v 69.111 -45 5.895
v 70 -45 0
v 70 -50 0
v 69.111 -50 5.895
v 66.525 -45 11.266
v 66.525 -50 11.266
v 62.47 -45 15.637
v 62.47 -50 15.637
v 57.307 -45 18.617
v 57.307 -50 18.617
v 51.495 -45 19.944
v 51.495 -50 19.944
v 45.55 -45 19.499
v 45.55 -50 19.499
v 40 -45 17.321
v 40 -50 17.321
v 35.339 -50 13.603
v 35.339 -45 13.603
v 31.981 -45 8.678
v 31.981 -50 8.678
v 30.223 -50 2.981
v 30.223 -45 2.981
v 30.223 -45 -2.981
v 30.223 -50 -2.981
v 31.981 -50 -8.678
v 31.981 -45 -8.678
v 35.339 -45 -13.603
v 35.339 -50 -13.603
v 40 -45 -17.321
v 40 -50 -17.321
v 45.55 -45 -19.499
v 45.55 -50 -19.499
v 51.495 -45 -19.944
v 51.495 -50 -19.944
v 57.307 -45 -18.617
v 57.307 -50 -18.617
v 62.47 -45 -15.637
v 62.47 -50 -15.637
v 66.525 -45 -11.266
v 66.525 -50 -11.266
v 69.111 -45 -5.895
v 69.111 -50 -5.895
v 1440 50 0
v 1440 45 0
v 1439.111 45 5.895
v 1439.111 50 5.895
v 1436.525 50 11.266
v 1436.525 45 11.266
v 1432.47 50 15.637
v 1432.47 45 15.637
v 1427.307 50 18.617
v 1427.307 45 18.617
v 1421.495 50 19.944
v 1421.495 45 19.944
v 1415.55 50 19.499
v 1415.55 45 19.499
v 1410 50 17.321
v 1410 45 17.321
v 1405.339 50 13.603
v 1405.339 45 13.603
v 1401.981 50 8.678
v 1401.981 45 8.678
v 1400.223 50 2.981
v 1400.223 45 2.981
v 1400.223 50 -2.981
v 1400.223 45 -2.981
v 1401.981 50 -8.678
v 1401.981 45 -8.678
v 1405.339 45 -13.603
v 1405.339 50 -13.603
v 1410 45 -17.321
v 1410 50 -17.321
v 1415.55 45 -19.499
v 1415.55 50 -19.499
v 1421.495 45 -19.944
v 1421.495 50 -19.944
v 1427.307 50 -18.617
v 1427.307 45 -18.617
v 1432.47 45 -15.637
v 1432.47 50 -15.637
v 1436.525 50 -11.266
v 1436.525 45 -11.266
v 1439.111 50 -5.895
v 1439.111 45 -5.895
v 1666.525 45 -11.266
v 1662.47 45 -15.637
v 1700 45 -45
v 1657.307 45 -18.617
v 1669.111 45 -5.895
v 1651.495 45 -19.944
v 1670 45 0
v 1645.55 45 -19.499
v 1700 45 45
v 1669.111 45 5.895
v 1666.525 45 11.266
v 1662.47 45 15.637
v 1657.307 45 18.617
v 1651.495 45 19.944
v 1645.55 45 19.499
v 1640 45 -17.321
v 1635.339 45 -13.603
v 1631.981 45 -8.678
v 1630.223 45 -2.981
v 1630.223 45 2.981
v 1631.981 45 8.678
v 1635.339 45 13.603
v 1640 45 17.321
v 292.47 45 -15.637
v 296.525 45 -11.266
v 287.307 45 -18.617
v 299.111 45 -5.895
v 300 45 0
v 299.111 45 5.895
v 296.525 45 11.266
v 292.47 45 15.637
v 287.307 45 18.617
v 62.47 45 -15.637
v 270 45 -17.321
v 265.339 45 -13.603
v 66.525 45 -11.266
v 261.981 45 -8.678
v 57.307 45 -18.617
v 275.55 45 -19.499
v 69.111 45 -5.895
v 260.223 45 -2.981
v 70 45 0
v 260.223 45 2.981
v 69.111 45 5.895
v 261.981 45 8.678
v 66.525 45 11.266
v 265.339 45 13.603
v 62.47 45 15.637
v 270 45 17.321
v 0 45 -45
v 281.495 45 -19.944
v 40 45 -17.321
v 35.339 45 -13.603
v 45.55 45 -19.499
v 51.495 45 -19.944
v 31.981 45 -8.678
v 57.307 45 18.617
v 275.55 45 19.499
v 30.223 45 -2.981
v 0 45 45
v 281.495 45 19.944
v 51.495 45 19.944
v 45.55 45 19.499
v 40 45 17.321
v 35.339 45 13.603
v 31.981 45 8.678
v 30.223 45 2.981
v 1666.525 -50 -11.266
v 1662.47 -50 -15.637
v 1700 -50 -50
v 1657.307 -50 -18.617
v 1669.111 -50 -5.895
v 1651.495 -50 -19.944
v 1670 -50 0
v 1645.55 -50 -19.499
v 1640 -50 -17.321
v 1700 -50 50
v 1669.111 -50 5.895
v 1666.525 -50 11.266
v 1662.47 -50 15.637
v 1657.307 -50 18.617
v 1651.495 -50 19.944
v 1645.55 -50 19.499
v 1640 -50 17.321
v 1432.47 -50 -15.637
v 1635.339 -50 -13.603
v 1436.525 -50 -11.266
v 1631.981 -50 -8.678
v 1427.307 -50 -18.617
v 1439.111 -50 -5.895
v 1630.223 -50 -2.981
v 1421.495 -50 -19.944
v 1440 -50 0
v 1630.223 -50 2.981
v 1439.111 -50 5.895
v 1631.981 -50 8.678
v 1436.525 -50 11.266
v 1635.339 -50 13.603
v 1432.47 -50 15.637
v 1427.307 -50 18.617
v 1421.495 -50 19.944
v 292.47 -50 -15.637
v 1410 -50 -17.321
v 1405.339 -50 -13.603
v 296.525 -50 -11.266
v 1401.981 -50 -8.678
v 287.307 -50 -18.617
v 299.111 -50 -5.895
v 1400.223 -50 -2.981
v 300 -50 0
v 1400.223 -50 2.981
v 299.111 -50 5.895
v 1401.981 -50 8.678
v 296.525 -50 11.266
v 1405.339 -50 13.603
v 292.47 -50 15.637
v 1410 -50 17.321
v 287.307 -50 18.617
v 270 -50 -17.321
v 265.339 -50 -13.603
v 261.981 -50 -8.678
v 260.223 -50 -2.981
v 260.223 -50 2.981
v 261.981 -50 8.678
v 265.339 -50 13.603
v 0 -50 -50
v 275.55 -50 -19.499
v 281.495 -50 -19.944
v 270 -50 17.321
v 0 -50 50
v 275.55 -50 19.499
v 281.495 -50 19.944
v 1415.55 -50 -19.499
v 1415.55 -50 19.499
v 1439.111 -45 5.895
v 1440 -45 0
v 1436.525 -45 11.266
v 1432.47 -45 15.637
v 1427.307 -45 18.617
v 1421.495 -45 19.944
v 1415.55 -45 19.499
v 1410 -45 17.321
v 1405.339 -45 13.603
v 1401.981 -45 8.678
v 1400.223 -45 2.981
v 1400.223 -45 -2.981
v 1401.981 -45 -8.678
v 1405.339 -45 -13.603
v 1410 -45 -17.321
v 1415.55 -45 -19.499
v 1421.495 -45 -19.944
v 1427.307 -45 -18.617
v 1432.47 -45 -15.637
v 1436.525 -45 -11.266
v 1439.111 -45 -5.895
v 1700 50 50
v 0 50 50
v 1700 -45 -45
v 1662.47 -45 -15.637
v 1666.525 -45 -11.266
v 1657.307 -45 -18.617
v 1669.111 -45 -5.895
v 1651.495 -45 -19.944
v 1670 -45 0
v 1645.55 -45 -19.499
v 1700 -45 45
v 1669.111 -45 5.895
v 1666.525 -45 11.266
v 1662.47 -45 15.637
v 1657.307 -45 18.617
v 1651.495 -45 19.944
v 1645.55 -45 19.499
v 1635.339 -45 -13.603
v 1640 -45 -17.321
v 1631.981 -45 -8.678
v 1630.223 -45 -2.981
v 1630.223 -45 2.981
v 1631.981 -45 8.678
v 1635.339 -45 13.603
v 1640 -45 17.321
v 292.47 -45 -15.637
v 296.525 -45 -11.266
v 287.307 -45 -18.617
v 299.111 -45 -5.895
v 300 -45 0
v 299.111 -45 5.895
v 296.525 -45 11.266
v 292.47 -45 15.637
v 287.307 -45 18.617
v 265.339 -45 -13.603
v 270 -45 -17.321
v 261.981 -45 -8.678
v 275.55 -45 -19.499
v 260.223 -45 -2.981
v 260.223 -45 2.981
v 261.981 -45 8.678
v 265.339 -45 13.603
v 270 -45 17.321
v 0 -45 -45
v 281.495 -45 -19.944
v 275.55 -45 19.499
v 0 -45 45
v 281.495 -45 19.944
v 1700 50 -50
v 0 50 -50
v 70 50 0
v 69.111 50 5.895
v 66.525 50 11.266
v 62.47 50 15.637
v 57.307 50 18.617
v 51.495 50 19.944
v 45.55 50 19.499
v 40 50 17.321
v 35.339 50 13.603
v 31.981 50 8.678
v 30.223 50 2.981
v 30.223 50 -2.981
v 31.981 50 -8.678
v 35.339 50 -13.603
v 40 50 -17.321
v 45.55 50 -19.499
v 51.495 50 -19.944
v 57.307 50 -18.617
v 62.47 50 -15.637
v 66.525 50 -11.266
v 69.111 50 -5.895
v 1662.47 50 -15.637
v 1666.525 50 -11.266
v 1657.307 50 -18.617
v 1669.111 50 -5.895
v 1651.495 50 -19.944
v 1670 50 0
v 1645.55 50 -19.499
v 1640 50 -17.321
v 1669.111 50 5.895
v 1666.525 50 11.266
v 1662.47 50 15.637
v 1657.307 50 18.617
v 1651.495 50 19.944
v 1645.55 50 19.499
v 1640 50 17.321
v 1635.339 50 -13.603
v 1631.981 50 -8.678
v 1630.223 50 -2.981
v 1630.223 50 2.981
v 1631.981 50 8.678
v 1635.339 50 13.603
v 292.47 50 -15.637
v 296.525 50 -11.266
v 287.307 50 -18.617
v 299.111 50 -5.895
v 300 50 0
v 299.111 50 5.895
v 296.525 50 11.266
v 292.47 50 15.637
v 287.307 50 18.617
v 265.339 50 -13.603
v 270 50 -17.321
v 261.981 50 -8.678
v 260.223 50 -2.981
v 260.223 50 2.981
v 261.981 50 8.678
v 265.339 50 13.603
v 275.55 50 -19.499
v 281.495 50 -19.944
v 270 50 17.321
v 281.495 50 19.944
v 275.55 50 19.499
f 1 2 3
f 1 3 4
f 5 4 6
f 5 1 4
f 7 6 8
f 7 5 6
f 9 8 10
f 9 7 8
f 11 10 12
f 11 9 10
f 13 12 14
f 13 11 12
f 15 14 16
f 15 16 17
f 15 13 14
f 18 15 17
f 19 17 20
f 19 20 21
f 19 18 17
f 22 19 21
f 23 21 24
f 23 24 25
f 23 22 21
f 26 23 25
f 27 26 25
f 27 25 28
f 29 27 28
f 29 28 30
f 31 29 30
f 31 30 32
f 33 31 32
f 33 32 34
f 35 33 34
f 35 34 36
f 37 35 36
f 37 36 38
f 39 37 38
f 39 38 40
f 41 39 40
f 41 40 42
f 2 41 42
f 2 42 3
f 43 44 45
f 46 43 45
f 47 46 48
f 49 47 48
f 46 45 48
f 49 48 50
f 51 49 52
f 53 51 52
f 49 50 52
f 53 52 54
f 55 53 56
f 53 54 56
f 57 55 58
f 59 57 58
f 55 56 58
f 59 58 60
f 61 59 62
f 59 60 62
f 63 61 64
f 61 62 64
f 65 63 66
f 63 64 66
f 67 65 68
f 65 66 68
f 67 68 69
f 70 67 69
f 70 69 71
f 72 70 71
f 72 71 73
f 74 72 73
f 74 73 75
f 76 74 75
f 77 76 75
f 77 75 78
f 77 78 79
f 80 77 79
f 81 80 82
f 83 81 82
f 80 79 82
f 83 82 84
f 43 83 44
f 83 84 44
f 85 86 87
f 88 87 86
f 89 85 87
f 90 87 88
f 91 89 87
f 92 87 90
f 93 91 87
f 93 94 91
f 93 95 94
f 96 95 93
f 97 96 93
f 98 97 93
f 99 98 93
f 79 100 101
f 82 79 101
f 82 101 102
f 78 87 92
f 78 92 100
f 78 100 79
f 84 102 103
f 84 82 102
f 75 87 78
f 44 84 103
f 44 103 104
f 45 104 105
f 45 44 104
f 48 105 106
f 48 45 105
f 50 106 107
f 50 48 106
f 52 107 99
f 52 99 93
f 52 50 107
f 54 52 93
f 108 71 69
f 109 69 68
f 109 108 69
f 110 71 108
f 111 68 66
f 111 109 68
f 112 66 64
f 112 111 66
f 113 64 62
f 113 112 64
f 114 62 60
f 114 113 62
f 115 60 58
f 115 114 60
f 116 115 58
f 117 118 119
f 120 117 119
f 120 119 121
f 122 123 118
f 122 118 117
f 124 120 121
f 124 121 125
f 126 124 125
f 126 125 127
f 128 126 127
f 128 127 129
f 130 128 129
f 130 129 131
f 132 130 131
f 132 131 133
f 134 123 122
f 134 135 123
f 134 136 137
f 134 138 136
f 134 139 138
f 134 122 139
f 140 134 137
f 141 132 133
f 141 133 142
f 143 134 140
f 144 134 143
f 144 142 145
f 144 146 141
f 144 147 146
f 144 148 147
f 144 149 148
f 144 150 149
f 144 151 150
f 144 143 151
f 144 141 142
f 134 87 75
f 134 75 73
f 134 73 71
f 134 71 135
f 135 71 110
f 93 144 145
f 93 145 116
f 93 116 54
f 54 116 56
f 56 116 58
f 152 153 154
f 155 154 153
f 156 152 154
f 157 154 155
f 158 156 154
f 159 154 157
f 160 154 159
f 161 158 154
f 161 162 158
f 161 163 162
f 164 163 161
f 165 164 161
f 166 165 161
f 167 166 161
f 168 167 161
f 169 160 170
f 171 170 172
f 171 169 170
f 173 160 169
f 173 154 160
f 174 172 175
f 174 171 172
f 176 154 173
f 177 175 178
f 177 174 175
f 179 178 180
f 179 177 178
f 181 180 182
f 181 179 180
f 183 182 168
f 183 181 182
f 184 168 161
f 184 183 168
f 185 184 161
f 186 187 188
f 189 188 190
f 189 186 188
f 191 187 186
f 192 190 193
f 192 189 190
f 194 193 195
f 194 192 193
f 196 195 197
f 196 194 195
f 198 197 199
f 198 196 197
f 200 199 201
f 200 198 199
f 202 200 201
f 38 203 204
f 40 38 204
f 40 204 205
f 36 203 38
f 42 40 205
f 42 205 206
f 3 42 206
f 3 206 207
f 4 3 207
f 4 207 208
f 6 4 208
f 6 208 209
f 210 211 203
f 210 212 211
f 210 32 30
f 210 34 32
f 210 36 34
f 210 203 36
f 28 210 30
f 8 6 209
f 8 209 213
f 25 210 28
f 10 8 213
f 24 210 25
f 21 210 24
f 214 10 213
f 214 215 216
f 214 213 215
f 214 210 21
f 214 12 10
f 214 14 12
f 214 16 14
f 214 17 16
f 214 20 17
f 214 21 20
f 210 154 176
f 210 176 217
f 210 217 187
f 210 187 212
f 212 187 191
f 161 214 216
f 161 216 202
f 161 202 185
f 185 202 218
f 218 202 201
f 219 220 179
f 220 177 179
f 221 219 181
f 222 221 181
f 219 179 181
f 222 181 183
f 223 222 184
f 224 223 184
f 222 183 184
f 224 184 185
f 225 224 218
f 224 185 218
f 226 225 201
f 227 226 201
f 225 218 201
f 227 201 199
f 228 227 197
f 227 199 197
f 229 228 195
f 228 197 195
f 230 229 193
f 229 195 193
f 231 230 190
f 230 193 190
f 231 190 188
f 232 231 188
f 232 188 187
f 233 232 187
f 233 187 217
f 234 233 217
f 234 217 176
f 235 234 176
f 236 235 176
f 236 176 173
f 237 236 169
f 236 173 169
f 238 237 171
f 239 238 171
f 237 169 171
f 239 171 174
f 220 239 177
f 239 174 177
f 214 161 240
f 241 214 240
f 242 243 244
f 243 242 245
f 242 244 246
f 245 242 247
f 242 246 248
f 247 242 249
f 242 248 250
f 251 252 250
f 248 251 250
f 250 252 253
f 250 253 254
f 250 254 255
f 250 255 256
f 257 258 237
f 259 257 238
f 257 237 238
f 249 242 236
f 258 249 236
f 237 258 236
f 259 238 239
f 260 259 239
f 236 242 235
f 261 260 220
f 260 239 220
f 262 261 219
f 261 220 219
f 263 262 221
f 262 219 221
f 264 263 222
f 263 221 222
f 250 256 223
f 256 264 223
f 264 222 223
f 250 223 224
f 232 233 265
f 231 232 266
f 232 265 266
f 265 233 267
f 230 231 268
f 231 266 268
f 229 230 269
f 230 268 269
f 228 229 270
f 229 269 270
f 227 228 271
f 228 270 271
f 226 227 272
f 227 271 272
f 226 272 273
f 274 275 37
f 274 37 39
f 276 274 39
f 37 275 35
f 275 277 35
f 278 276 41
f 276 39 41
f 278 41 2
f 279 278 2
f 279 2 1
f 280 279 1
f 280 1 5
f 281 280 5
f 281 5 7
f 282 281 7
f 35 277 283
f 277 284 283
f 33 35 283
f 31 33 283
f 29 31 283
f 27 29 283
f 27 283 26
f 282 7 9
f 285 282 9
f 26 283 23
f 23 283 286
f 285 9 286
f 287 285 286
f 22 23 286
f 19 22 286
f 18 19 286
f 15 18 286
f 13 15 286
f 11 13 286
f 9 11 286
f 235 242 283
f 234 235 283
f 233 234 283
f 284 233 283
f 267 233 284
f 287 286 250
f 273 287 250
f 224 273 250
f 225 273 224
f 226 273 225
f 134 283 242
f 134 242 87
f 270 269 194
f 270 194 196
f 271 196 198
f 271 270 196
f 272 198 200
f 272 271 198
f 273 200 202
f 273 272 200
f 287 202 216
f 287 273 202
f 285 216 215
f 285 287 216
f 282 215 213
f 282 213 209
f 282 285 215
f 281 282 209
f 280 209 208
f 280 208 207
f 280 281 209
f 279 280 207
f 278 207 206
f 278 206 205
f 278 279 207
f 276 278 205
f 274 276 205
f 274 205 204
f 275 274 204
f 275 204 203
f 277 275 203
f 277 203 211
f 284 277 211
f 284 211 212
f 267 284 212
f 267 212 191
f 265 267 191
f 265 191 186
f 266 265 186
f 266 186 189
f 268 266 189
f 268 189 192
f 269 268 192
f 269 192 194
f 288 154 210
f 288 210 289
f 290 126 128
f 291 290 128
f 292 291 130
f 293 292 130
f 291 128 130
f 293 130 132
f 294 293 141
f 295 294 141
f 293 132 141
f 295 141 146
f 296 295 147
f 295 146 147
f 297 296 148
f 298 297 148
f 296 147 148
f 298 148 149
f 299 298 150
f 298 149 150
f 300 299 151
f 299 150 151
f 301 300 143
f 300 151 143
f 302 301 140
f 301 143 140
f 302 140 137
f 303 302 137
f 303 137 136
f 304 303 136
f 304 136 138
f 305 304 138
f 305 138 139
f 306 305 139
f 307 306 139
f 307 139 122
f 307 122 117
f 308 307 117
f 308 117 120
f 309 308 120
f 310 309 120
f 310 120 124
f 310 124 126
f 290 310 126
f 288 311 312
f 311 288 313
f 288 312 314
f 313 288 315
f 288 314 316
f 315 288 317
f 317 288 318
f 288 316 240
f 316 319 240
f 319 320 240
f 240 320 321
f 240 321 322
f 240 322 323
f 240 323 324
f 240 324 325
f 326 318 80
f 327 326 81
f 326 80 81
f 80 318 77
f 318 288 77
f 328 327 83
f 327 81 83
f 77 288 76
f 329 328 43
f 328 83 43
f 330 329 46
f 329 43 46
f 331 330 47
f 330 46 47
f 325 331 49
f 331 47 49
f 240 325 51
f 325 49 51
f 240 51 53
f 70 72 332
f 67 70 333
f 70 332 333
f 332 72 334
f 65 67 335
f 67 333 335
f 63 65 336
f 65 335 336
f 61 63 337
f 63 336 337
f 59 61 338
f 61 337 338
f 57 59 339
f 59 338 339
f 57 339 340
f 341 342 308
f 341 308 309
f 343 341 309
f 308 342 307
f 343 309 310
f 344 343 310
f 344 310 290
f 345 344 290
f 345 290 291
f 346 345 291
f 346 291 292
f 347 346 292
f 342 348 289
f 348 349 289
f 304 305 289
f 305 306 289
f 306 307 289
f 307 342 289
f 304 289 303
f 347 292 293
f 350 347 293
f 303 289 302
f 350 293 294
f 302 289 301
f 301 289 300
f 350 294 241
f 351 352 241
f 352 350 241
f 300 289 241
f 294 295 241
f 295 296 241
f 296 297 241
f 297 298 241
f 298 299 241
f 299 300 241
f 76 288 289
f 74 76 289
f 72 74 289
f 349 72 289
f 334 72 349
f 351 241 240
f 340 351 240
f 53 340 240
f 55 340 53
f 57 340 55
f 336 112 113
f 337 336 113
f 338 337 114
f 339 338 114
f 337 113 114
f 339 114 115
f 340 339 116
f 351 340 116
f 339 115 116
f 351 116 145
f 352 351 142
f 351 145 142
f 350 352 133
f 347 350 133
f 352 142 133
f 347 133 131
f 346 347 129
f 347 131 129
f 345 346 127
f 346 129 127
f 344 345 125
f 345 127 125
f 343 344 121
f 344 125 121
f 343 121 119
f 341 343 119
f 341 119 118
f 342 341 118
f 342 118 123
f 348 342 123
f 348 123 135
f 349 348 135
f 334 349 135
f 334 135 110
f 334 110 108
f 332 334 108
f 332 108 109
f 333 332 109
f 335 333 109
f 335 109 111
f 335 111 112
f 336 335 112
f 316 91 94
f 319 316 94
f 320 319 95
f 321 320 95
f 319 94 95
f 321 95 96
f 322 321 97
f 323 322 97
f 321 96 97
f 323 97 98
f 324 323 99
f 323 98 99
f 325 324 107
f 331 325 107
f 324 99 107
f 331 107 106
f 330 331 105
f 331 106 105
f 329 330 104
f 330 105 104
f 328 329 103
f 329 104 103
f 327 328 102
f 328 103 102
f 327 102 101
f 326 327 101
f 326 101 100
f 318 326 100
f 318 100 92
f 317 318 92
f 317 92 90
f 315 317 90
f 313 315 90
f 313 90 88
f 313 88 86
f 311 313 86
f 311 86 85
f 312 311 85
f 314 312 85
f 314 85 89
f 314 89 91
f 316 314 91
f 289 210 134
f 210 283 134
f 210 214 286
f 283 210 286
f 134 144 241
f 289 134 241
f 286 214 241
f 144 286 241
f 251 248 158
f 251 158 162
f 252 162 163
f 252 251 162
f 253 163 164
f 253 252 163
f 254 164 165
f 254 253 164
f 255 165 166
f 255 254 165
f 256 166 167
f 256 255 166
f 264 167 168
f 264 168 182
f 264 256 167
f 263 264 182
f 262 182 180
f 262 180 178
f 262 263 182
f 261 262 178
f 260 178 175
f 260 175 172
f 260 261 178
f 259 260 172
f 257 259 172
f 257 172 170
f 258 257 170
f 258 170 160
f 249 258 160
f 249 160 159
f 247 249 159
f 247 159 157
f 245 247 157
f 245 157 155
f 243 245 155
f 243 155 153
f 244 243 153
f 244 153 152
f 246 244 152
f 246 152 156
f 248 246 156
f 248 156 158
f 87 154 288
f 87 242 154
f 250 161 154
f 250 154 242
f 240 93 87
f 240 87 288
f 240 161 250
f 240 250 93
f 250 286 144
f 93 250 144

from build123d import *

# Parameters (mm, degrees)
F0_W     = 100
F0_H     = 100
F0_W_2   = 90
F0_H_2   = 90
F1_DEPTH = 1700
F2_R     = 20
F3_DEPTH = 50


with BuildPart() as f1:
    # F0 (on Right) → F1 (new body)
    with BuildSketch(Plane.YZ):
        Rectangle(F0_W, F0_H)
        Rectangle(F0_W_2, F0_H_2, mode=Mode.SUBTRACT)
    extrude(amount=F1_DEPTH)

    # F2 (on Front) → F3 (cut, symmetric)
    with BuildSketch(Plane.XZ):
        with Locations((50, 0)):
            Circle(F2_R)
        with Locations((1650, 0)):
            Circle(F2_R)
        with Locations((280, 0)):
            Circle(F2_R)
        with Locations((1420, 0)):
            Circle(F2_R)
    extrude(amount=F3_DEPTH, both=True, mode=Mode.SUBTRACT)


solid = f1.part
